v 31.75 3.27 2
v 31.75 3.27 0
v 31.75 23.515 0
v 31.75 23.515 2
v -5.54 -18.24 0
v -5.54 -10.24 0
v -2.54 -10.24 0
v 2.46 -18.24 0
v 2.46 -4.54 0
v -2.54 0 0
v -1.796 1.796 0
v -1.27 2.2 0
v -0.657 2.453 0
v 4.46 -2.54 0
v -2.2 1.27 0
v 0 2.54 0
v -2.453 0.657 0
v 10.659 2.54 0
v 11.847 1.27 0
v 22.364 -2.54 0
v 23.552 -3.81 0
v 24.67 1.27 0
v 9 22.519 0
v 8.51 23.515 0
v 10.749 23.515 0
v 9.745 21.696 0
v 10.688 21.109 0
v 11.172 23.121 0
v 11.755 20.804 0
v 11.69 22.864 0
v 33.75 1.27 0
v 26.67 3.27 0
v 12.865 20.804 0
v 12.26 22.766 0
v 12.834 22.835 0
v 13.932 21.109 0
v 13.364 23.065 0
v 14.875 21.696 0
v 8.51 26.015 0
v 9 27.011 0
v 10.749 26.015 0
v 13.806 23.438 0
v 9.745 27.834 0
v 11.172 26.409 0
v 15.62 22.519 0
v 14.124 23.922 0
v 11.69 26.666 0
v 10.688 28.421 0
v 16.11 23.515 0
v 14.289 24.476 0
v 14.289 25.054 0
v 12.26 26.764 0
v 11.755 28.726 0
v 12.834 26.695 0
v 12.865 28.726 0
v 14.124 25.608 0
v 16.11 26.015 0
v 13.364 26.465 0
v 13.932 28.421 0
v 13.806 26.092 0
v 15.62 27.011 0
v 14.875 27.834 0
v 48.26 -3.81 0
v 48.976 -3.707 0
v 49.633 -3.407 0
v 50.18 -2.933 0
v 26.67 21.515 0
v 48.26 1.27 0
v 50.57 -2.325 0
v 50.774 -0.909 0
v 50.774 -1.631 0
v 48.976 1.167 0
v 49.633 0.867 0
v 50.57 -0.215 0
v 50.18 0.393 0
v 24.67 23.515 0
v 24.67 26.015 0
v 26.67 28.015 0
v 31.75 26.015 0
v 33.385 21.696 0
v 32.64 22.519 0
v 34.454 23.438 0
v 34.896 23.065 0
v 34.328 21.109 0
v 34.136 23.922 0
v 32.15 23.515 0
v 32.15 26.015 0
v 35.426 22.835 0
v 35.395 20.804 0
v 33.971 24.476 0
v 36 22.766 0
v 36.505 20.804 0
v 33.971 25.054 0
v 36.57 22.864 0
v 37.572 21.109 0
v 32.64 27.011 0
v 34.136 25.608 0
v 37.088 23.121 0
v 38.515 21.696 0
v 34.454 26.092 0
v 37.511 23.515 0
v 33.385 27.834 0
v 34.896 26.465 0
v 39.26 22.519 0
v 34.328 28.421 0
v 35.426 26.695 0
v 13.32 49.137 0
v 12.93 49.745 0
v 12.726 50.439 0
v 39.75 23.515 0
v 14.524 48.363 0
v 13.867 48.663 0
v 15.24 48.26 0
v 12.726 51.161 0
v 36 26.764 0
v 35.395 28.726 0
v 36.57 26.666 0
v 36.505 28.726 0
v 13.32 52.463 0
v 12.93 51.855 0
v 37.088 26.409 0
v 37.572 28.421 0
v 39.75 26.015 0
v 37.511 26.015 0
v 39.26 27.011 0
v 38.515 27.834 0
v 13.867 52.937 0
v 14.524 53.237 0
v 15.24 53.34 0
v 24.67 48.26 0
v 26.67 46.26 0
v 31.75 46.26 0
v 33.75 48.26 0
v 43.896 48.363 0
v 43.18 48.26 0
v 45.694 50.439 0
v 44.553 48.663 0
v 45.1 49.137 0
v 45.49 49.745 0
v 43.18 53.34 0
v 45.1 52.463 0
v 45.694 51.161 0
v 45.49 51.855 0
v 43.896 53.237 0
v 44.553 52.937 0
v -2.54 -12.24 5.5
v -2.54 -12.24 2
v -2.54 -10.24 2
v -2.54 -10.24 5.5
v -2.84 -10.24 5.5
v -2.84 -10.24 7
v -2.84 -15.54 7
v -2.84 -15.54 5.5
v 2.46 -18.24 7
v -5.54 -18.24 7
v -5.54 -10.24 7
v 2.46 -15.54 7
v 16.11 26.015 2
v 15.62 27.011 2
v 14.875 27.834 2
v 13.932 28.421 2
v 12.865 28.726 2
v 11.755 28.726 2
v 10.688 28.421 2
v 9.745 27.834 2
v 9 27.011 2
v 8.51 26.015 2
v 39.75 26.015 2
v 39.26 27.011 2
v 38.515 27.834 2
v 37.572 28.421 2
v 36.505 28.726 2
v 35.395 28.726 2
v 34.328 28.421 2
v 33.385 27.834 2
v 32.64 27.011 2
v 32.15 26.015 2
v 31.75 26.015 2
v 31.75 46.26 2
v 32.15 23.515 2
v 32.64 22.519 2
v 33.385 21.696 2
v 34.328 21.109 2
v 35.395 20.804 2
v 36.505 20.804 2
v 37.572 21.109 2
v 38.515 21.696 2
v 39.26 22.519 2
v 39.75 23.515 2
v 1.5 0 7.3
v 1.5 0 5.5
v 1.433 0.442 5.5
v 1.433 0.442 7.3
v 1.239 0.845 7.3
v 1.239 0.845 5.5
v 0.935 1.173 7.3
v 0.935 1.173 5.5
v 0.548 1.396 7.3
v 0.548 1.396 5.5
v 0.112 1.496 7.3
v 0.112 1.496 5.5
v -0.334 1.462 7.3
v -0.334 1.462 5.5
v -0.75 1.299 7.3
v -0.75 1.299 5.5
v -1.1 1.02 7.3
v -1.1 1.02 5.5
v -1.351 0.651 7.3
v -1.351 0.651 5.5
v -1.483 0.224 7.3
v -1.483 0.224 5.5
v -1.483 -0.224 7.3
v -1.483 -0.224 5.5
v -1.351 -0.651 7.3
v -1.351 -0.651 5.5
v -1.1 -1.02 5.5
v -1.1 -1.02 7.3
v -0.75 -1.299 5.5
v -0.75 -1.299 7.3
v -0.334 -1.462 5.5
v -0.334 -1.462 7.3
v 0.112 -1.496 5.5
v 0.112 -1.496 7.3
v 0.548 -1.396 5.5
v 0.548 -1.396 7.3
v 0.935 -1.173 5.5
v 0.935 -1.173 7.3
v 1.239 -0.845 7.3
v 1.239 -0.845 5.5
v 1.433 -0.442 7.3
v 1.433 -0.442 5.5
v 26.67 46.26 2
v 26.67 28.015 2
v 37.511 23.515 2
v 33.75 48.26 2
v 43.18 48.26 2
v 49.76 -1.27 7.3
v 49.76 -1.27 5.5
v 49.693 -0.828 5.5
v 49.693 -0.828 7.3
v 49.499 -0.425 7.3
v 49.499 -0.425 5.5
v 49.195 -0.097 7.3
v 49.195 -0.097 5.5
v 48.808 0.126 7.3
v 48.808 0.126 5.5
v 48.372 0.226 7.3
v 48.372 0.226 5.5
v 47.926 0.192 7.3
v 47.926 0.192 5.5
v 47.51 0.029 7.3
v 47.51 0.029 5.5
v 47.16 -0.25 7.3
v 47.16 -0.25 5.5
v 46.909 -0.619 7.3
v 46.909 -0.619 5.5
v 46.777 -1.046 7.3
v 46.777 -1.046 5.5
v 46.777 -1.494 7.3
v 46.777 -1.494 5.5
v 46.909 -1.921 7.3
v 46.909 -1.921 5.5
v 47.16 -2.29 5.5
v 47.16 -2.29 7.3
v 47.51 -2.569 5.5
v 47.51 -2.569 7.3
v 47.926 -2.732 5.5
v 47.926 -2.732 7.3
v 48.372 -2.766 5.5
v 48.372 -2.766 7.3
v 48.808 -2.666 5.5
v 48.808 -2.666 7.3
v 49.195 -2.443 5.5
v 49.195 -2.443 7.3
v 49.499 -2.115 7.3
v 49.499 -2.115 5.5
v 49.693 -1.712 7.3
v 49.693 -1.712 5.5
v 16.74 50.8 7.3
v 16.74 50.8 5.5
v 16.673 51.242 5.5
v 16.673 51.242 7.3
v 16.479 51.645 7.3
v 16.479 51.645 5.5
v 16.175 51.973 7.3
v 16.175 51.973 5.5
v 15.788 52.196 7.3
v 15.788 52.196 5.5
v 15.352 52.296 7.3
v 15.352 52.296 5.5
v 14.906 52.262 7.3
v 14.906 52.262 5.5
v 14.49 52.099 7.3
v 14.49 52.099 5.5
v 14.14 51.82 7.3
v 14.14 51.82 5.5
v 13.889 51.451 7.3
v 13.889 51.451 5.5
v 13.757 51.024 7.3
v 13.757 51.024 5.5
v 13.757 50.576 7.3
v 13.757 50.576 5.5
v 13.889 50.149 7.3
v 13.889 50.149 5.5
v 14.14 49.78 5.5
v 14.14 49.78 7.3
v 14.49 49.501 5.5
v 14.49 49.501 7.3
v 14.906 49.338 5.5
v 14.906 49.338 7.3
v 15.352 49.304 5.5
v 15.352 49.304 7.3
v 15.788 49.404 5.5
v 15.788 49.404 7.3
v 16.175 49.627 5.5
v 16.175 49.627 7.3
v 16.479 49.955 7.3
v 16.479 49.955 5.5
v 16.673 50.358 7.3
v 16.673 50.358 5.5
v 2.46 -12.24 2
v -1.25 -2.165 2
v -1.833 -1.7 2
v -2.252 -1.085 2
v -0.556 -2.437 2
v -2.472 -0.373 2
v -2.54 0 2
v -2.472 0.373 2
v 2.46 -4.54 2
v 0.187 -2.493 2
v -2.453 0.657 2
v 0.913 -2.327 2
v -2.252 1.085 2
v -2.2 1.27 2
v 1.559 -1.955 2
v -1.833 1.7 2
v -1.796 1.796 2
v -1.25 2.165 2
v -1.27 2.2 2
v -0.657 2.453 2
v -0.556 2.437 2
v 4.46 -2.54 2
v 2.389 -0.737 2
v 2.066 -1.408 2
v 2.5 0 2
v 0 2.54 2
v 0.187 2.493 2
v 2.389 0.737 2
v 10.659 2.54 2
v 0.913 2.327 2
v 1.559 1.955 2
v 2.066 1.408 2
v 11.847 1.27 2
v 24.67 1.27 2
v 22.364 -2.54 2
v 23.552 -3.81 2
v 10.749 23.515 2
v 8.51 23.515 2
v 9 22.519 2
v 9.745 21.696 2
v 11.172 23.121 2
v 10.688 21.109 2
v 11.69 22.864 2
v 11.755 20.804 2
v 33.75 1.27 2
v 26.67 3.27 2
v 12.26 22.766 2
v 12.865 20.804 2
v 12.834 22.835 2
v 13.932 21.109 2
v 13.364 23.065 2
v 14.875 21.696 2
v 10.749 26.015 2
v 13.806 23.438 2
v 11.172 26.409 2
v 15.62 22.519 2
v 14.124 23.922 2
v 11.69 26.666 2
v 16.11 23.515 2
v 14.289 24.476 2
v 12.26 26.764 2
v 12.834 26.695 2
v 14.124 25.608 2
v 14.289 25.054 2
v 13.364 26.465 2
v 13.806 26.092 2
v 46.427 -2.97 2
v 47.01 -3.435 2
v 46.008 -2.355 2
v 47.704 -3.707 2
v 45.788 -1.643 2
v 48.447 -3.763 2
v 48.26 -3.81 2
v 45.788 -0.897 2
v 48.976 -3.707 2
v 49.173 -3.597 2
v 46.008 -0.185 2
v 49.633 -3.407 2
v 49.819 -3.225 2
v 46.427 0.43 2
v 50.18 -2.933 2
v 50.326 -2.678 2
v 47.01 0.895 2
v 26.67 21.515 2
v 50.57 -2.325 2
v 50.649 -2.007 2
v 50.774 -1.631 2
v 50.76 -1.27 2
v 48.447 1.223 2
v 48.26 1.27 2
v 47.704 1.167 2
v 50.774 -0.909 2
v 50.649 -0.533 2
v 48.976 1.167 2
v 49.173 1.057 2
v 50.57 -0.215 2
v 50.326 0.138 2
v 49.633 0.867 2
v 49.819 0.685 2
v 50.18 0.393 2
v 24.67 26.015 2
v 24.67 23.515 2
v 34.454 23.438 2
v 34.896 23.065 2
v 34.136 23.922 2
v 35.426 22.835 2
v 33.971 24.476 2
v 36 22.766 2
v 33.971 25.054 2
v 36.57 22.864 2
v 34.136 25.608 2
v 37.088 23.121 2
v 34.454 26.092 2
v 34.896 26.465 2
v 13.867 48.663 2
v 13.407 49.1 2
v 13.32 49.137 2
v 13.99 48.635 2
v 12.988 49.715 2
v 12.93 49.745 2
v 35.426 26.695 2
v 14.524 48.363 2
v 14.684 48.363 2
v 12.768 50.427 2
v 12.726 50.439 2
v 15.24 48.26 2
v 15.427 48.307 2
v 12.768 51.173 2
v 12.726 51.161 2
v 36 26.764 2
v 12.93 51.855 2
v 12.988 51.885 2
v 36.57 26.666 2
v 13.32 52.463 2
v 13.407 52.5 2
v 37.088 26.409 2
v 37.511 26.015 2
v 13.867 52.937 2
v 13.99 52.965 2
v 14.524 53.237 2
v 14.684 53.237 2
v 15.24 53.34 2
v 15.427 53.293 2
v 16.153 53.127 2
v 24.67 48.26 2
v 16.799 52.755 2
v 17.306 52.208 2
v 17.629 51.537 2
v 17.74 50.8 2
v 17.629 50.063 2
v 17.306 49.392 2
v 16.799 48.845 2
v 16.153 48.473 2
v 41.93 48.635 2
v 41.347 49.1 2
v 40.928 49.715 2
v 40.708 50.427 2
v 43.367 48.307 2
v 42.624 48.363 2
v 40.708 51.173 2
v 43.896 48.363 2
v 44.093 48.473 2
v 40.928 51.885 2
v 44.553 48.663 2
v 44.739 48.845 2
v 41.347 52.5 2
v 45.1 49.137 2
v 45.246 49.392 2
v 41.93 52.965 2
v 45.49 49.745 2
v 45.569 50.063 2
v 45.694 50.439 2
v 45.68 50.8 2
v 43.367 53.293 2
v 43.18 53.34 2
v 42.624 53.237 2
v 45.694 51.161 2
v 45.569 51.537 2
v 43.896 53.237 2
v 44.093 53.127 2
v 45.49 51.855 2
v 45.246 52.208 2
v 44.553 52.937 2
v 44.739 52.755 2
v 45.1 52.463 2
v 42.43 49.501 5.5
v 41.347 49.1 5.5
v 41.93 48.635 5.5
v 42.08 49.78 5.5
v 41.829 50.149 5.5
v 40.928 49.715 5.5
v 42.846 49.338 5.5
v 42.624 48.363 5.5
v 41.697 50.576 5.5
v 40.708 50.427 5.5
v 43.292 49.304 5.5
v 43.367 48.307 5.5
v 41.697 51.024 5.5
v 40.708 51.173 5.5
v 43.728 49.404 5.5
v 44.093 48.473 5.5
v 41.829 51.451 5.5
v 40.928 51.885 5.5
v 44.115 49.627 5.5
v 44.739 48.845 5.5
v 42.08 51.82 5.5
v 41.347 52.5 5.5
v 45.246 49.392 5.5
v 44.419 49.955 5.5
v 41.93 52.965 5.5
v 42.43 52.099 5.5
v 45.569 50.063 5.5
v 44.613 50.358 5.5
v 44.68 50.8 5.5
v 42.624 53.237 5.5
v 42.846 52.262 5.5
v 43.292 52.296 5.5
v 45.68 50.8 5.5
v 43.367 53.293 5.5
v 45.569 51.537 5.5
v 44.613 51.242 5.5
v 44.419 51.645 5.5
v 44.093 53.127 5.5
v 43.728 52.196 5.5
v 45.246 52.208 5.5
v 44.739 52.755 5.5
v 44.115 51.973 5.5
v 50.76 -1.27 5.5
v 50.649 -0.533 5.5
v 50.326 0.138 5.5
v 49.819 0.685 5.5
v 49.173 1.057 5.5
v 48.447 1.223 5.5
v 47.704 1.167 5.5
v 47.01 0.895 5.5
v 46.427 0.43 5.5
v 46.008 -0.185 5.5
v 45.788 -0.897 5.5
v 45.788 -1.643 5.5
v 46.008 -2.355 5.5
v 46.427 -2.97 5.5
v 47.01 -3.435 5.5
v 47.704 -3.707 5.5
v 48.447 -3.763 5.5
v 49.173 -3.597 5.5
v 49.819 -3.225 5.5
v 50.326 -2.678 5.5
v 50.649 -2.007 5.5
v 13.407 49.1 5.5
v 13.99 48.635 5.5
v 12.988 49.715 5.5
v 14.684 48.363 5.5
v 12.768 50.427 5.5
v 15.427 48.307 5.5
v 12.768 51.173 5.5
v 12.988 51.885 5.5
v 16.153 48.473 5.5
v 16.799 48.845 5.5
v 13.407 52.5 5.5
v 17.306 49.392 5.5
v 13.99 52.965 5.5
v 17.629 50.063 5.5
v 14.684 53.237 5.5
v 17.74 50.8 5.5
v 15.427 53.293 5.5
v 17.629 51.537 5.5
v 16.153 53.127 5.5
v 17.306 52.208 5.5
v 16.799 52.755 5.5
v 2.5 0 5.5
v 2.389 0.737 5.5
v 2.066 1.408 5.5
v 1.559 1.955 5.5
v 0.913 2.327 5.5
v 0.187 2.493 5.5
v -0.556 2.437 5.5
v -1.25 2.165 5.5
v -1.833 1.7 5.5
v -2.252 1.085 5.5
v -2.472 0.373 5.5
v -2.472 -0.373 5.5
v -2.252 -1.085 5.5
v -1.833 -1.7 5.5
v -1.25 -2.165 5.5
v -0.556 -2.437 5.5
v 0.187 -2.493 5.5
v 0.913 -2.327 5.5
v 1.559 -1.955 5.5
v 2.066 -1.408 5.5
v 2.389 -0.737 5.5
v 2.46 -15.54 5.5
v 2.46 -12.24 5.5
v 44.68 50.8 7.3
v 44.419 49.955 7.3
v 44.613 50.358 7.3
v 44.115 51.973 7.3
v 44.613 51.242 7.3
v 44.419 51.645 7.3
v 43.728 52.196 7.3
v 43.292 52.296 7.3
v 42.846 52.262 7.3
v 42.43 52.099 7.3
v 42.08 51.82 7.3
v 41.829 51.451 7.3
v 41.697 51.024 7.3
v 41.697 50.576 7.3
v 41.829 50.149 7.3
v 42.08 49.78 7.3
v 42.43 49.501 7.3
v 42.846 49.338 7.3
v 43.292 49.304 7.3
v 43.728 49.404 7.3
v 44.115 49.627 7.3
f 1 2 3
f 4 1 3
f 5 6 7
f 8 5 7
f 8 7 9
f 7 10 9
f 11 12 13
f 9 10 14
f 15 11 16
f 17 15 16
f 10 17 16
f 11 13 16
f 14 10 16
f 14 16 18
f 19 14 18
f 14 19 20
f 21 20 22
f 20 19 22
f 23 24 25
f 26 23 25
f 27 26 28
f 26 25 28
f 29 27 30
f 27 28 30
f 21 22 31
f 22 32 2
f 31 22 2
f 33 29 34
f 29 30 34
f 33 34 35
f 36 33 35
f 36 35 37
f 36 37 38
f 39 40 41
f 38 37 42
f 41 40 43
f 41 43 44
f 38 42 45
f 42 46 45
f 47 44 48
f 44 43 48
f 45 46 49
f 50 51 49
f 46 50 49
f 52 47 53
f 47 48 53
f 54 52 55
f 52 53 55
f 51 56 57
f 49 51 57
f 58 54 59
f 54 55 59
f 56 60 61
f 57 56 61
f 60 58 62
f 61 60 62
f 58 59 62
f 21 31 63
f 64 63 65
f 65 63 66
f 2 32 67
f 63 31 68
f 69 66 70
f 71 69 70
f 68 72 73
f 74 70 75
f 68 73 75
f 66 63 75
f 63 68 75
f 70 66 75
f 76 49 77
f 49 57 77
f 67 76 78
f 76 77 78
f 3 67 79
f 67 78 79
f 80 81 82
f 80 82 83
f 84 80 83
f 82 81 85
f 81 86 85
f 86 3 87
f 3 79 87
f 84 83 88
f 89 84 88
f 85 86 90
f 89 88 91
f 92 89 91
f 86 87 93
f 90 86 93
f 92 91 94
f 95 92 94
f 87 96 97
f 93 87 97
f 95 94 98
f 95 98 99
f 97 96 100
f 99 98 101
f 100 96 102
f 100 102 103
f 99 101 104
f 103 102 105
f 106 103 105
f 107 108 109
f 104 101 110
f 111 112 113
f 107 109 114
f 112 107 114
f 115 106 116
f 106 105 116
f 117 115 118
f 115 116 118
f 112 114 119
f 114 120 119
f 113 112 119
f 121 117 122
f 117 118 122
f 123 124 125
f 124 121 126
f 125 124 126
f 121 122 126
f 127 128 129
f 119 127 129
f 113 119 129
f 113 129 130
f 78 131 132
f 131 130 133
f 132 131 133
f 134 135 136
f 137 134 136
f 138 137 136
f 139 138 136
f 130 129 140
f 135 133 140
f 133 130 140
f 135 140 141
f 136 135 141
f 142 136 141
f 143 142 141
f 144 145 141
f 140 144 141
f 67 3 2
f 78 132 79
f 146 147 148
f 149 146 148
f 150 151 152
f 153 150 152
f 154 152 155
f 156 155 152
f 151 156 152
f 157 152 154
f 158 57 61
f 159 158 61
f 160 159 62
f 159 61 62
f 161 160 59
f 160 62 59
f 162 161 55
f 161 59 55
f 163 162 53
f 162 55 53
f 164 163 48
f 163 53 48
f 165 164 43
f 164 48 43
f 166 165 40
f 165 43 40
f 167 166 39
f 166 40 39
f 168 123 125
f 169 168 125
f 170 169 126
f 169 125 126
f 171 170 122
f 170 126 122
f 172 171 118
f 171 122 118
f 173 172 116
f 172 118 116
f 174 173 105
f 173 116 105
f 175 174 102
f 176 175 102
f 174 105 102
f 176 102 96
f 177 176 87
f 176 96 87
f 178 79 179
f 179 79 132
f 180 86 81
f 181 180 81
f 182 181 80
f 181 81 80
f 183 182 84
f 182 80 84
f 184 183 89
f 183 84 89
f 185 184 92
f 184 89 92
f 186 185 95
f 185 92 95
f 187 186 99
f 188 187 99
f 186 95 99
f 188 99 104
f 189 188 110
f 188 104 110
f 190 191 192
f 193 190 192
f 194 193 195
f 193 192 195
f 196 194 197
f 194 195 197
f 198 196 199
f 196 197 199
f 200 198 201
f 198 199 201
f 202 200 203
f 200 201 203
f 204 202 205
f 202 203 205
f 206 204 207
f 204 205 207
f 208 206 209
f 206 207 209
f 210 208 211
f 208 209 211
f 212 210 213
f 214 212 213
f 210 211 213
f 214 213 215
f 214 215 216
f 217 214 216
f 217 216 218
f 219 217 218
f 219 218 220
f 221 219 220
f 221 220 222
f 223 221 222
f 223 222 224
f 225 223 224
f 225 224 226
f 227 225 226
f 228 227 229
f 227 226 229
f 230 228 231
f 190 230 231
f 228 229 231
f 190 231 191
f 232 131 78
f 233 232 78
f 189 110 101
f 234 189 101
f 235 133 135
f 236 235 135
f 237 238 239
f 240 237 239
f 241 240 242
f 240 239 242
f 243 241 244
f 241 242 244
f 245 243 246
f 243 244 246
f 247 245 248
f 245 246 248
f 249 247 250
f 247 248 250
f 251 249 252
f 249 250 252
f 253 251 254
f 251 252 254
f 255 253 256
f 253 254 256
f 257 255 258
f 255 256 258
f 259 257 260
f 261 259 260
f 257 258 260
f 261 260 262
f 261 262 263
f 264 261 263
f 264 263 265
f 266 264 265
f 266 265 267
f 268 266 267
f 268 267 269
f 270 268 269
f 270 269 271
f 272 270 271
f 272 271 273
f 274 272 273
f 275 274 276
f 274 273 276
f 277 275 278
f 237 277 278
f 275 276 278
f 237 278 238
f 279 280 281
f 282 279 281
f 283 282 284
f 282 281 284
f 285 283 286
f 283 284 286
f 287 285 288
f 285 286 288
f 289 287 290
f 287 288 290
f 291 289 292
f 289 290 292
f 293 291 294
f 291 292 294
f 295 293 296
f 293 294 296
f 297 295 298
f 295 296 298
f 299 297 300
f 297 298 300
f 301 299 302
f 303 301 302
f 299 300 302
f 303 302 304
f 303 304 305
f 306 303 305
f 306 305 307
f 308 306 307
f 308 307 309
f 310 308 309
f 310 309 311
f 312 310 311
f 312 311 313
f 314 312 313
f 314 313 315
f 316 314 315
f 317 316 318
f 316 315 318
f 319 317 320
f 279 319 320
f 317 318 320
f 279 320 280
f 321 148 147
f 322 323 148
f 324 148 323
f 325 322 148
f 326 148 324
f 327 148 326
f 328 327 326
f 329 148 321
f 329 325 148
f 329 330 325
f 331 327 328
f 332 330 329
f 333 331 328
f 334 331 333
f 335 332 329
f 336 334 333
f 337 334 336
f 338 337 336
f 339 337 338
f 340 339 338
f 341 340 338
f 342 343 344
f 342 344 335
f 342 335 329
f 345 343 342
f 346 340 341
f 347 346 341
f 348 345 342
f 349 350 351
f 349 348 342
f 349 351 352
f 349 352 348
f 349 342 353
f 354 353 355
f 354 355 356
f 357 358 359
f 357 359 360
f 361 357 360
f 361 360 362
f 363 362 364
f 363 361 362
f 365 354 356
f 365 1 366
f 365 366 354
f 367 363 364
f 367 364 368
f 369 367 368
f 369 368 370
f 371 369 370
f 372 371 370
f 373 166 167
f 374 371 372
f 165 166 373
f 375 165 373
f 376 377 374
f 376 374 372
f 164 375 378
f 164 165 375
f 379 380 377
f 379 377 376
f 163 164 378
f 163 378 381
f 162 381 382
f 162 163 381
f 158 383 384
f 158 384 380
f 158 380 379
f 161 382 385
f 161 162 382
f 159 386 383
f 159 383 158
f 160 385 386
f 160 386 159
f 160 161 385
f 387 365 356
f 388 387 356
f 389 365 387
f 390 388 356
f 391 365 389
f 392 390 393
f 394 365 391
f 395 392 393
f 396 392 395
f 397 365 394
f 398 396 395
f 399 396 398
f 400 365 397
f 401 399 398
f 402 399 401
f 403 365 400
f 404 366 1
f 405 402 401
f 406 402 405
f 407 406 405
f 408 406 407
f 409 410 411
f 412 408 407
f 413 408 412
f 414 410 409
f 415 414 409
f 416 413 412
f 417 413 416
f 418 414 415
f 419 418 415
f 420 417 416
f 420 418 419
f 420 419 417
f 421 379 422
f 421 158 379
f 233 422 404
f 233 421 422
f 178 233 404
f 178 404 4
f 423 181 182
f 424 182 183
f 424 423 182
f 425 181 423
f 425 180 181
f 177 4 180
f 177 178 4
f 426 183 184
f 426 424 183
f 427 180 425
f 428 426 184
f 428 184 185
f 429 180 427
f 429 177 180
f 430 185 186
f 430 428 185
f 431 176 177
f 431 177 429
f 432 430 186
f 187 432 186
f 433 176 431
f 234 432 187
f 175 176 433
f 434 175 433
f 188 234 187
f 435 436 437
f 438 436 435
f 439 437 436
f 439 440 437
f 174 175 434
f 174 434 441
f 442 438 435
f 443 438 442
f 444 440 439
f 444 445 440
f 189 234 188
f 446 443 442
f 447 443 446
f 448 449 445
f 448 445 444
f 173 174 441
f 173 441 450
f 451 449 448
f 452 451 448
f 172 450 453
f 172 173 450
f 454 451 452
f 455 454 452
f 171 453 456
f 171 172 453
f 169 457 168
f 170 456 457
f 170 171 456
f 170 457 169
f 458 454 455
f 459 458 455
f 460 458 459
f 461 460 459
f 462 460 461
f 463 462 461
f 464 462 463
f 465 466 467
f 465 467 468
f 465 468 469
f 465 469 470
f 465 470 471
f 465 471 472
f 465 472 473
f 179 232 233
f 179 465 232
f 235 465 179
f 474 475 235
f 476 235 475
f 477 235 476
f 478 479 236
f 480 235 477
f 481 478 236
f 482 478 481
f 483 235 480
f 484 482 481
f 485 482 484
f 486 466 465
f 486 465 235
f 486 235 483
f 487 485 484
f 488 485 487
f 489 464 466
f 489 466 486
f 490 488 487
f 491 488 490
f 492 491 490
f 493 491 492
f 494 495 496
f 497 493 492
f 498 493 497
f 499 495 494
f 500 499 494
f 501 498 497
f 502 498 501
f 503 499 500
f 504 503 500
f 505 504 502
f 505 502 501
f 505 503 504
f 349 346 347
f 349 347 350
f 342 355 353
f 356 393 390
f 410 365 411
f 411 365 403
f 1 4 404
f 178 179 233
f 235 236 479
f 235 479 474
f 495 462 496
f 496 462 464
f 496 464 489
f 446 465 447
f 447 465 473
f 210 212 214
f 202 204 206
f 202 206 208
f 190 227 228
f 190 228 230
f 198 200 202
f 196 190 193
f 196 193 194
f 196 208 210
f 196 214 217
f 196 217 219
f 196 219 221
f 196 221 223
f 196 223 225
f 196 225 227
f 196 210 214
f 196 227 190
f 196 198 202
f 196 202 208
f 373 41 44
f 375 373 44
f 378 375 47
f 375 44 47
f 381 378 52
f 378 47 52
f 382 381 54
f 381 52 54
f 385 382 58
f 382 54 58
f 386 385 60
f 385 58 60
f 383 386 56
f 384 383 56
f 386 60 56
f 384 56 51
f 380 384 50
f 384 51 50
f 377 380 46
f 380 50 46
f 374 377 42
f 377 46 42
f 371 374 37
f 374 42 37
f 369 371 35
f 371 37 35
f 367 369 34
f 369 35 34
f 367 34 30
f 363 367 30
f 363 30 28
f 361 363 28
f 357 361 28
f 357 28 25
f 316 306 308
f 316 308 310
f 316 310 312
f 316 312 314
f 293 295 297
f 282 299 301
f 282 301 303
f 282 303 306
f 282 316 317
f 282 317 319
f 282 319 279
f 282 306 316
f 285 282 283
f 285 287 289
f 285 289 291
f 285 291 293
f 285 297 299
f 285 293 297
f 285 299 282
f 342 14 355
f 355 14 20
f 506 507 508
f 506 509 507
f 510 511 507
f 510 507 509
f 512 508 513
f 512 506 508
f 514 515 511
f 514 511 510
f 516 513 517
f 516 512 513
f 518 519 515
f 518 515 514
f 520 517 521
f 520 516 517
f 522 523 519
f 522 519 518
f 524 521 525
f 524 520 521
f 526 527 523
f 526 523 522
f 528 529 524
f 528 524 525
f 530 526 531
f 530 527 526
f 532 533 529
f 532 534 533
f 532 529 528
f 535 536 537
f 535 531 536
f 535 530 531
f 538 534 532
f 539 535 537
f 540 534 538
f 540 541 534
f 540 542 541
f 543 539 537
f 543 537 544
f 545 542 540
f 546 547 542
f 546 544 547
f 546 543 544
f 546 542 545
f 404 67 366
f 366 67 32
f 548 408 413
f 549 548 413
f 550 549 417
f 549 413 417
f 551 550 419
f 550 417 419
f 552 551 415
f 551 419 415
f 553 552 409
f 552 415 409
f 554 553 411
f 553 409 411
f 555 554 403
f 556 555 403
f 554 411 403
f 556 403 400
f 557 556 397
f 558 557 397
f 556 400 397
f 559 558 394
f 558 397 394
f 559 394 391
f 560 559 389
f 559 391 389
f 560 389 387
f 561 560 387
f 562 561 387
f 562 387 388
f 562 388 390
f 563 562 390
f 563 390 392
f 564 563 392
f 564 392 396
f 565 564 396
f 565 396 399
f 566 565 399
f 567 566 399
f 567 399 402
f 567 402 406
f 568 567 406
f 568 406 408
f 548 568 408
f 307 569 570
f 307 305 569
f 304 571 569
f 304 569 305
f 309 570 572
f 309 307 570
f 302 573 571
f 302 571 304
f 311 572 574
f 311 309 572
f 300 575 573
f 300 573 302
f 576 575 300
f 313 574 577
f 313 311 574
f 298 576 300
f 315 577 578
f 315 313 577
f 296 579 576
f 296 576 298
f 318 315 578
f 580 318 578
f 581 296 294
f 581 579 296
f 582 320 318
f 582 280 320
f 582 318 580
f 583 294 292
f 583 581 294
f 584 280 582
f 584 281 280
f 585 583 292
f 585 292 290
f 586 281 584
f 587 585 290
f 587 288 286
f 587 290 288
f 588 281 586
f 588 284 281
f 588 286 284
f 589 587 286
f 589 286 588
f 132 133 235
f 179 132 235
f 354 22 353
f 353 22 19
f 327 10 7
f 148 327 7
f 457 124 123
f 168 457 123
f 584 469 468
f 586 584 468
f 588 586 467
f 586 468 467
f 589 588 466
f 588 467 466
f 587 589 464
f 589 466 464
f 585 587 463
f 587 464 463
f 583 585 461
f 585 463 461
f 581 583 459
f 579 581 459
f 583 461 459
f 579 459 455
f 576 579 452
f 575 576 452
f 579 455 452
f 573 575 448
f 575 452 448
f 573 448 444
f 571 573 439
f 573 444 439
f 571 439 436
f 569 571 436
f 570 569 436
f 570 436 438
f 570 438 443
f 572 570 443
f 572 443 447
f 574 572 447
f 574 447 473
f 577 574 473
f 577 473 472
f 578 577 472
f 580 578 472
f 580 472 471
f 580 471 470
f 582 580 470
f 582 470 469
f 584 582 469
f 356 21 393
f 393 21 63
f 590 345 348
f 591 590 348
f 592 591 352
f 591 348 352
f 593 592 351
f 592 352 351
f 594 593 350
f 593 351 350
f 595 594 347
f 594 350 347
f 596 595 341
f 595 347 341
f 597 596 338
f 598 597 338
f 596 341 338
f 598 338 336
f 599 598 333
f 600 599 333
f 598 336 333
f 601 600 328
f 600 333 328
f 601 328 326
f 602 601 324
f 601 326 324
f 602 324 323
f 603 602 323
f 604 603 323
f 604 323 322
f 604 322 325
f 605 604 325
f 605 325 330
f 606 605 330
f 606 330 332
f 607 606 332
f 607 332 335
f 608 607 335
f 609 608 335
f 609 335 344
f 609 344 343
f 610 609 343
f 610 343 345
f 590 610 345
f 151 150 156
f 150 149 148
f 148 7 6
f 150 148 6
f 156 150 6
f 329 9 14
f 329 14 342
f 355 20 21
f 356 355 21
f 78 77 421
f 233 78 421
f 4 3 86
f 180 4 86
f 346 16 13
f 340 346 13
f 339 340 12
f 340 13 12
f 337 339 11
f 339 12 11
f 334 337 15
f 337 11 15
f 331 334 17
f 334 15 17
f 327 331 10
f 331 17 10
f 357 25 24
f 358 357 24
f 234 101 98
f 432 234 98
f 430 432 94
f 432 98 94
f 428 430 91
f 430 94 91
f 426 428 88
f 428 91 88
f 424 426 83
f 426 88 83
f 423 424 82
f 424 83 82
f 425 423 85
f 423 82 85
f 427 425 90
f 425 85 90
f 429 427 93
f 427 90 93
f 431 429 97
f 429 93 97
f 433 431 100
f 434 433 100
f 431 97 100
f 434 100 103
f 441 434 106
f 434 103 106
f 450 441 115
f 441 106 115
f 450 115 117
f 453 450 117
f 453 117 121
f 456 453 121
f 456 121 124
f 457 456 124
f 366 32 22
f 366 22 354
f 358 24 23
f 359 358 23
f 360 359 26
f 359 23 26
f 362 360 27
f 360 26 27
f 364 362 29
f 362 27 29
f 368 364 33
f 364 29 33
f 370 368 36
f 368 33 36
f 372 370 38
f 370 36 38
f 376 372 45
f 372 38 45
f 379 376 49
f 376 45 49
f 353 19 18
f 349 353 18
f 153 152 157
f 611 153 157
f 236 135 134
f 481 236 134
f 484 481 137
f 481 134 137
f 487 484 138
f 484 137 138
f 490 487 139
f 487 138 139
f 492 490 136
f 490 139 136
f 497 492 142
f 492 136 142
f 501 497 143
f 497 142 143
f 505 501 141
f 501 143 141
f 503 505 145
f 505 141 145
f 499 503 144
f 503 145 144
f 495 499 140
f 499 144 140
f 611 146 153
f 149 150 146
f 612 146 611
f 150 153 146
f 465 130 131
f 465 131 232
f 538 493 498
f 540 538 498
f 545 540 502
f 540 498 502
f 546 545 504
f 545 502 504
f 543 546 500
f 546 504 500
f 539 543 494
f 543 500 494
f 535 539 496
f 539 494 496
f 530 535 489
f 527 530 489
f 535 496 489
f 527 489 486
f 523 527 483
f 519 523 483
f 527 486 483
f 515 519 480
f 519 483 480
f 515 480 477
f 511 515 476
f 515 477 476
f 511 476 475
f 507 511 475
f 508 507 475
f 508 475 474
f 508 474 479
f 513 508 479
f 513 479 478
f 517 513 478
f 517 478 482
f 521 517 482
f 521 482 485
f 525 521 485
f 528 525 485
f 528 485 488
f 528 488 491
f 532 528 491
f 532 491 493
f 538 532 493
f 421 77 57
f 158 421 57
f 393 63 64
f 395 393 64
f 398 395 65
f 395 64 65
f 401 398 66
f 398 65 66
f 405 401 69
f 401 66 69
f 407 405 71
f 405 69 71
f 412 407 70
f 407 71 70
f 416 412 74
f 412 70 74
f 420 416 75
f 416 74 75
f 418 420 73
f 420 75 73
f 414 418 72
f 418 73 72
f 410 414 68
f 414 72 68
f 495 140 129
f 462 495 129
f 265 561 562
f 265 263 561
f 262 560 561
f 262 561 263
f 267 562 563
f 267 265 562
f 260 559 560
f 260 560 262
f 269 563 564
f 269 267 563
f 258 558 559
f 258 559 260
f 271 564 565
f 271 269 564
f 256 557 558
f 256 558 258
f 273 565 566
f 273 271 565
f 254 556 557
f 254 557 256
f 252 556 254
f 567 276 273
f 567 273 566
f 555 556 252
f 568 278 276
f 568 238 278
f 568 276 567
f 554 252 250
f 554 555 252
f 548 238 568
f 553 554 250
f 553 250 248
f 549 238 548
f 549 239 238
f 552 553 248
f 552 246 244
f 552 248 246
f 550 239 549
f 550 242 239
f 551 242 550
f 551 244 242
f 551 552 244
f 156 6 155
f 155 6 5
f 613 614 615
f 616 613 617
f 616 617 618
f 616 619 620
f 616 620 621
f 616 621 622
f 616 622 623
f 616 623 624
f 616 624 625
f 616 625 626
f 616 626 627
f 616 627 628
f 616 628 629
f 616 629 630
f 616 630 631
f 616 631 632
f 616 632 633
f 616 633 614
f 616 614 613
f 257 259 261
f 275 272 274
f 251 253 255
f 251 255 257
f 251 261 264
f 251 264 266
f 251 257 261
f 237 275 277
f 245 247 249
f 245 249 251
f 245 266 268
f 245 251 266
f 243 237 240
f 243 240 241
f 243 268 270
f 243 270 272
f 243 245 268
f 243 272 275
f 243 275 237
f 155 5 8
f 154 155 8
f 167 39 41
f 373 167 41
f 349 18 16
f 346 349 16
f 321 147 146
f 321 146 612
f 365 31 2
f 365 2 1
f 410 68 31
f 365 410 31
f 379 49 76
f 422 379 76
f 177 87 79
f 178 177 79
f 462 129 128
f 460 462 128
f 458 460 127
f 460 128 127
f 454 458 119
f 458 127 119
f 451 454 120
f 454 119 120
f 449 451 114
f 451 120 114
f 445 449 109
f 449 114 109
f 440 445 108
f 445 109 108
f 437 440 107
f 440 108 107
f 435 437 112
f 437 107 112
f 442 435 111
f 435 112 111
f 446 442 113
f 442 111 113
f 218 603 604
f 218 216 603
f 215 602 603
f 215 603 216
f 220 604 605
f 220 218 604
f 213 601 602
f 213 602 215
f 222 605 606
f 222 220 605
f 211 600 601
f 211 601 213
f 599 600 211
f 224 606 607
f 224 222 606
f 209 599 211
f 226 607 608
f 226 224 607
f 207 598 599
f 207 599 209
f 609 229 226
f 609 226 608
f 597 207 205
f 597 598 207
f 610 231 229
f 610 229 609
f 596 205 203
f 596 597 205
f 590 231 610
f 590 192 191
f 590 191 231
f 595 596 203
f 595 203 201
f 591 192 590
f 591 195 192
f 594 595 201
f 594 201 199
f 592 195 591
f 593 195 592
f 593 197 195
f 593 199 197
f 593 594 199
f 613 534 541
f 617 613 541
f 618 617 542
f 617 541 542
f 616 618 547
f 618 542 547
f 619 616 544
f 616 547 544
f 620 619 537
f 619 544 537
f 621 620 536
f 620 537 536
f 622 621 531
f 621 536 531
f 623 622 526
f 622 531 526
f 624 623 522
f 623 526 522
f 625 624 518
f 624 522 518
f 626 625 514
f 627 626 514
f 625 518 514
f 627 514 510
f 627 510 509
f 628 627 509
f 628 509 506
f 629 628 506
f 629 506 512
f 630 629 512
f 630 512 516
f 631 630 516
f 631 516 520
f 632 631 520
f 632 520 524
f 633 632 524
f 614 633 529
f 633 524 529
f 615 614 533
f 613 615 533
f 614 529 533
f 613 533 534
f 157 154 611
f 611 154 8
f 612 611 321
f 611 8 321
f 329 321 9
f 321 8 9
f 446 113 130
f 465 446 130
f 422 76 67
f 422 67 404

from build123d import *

# Parameters (mm, degrees)
F1_DEPTH  = 2
F3_DEPTH  = 7
F4_R      = 2.5
F4_W      = 5
F4_H      = 3
F5_DEPTH  = 5.5
F6_R      = 1.5
F7_DEPTH  = 1.8
F9_DEPTH  = 1.5
F10_SIZE  = 2
F12_DEPTH = 2
F13_SIZE  = 2


# Not quite as in the source:
# - a feature names something its author has since deleted; it is built from what else it names


with BuildPart() as f1:
    # F0 (on Top) → F1 (new body)
    with BuildSketch(Plane.XY):
        with BuildLine():
            Line((2.46, -15.24), (2.46, -2.54))
            Line((2.46, -2.54), (22.3642048012, -2.54))
            Line((22.3642048012, -2.54), (23.5517361372, -3.81))
            Line((23.5517361372, -3.81), (48.26, -3.81))
            ThreePointArc((48.26, -3.81), (50.8, -1.27), (48.26, 1.27))
            Line((48.26, 1.27), (31.75, 1.27))
            Line((31.75, 1.27), (31.75, 48.26))
            Line((31.75, 48.26), (43.18, 48.26))
            ThreePointArc((43.18, 48.26), (45.72, 50.8), (43.18, 53.34))
            Line((43.18, 53.34), (15.24, 53.34))
            ThreePointArc((15.24, 53.34), (12.7, 50.8), (15.24, 48.26))
            Line((15.24, 48.26), (26.67, 48.26))
            Line((26.67, 48.26), (26.67, 1.27))
            Line((26.67, 1.27), (11.8467498474, 1.27))
            Line((11.8467498474, 1.27), (10.6592185114, 2.54))
            Line((10.6592185114, 2.54), (0, 2.54))
            ThreePointArc((0, 2.54), (-1.7960512242, 1.7960512242), (-2.54, 0))
            Line((-2.54, 0), (-2.54, -15.24))
            Line((-2.54, -15.24), (2.46, -15.24))
        make_face()
    extrude(amount=F1_DEPTH)

    # F2 (on Top) → F3 (join)
    with BuildSketch(Plane.XY):
        Polygon((2.46, -18.24), (2.46, -15.24), (-2.54, -15.24), (-2.54, -10.24), (-5.54, -10.24), (-5.54, -18.24), align=None)
    extrude(amount=F3_DEPTH)

    # F4 (on Top) → F5 (join)
    with BuildSketch(Plane.XY):
        Circle(F4_R)
        with Locations((48.26, -1.27)):
            Circle(F4_R)
        with Locations((15.24, 50.8)):
            Circle(F4_R)
        with Locations((43.18, 50.8)):
            Circle(F4_R)
        with Locations((-0.04, -13.74)):
            Rectangle(F4_W, F4_H)
    extrude(amount=F5_DEPTH)

    # F6 (on face) → F7 (join)
    with BuildSketch(Plane.XY.offset(5.5)):
        Circle(F6_R)
        with Locations((48.26, -1.27)):
            Circle(F6_R)
        with Locations((15.24, 50.8)):
            Circle(F6_R)
        with Locations((43.18, 50.8)):
            Circle(F6_R)
    extrude(amount=F7_DEPTH)

    # F8 (on face) → F9 (cut)
    with BuildSketch(Plane.XY.offset(7)):
        Polygon((2.46, -15.24), (-2.54, -15.24), (-2.54, -10.24), (-2.84, -10.24), (-2.84, -15.54), (2.46, -15.54), align=None)
    extrude(amount=-F9_DEPTH, mode=Mode.SUBTRACT)

    # F10
    f10_edges = [f1.edges().sort_by_distance(p)[0] for p in [
        (31.75, 48.26, 1),
        (26.67, 48.26, 1),
        (26.67, 1.27, 1),
        (31.75, 1.27, 1),
        (2.46, -2.54, 1),
    ]]
    chamfer(f10_edges, length=F10_SIZE)

    # F11 (on Top) → F12 (join)
    with BuildSketch(Plane.XY):
        with BuildLine():
            ThreePointArc((37.5112494996, 23.515), (33.95, 24.765), (37.5112494996, 26.015))
            Line((37.5112494996, 26.015), (39.7496710384, 26.015))
            ThreePointArc((39.7496710384, 26.015), (35.95, 28.765), (32.1503289616, 26.015))
            ThreePointArc((32.1503289616, 26.015), (31.95, 24.765), (32.1503289616, 23.515))
            ThreePointArc((32.1503289616, 23.515), (35.95, 20.765), (39.7496710384, 23.515))
            Line((39.7496710384, 23.515), (37.5112494996, 23.515))
        make_face()
        with BuildLine():
            ThreePointArc((32.1503289616, 23.515), (31.95, 24.765), (32.1503289616, 26.015))
            Line((32.1503289616, 26.015), (31.75, 26.015))
            Line((31.75, 26.015), (31.75, 23.515))
            Line((31.75, 23.515), (32.1503289616, 23.515))
        make_face()
        with BuildLine():
            ThreePointArc((16.1096710384, 26.015), (12.31, 28.765), (8.5103289616, 26.015))
            Line((8.5103289616, 26.015), (10.7487505004, 26.015))
            ThreePointArc((10.7487505004, 26.015), (14.31, 24.765), (10.7487505004, 23.515))
            Line((10.7487505004, 23.515), (8.5103289616, 23.515))
            ThreePointArc((8.5103289616, 23.515), (12.31, 20.765), (16.1096710384, 23.515))
            ThreePointArc((16.1096710384, 23.515), (16.31, 24.765), (16.1096710384, 26.015))
        make_face()
        with BuildLine():
            Line((26.67, 26.015), (16.1096710384, 26.015))
            ThreePointArc((16.1096710384, 26.015), (16.31, 24.765), (16.1096710384, 23.515))
            Line((16.1096710384, 23.515), (26.67, 23.515))
            Line((26.67, 23.515), (26.67, 26.015))
        make_face()
    extrude(amount=F12_DEPTH)

    # F13
    f13_edges = [f1.edges().sort_by_distance(p)[0] for p in [
        (26.67, 23.515, 1),
        (26.67, 26.015, 1),
    ]]
    chamfer(f13_edges, length=F13_SIZE)


solid = f1.part
